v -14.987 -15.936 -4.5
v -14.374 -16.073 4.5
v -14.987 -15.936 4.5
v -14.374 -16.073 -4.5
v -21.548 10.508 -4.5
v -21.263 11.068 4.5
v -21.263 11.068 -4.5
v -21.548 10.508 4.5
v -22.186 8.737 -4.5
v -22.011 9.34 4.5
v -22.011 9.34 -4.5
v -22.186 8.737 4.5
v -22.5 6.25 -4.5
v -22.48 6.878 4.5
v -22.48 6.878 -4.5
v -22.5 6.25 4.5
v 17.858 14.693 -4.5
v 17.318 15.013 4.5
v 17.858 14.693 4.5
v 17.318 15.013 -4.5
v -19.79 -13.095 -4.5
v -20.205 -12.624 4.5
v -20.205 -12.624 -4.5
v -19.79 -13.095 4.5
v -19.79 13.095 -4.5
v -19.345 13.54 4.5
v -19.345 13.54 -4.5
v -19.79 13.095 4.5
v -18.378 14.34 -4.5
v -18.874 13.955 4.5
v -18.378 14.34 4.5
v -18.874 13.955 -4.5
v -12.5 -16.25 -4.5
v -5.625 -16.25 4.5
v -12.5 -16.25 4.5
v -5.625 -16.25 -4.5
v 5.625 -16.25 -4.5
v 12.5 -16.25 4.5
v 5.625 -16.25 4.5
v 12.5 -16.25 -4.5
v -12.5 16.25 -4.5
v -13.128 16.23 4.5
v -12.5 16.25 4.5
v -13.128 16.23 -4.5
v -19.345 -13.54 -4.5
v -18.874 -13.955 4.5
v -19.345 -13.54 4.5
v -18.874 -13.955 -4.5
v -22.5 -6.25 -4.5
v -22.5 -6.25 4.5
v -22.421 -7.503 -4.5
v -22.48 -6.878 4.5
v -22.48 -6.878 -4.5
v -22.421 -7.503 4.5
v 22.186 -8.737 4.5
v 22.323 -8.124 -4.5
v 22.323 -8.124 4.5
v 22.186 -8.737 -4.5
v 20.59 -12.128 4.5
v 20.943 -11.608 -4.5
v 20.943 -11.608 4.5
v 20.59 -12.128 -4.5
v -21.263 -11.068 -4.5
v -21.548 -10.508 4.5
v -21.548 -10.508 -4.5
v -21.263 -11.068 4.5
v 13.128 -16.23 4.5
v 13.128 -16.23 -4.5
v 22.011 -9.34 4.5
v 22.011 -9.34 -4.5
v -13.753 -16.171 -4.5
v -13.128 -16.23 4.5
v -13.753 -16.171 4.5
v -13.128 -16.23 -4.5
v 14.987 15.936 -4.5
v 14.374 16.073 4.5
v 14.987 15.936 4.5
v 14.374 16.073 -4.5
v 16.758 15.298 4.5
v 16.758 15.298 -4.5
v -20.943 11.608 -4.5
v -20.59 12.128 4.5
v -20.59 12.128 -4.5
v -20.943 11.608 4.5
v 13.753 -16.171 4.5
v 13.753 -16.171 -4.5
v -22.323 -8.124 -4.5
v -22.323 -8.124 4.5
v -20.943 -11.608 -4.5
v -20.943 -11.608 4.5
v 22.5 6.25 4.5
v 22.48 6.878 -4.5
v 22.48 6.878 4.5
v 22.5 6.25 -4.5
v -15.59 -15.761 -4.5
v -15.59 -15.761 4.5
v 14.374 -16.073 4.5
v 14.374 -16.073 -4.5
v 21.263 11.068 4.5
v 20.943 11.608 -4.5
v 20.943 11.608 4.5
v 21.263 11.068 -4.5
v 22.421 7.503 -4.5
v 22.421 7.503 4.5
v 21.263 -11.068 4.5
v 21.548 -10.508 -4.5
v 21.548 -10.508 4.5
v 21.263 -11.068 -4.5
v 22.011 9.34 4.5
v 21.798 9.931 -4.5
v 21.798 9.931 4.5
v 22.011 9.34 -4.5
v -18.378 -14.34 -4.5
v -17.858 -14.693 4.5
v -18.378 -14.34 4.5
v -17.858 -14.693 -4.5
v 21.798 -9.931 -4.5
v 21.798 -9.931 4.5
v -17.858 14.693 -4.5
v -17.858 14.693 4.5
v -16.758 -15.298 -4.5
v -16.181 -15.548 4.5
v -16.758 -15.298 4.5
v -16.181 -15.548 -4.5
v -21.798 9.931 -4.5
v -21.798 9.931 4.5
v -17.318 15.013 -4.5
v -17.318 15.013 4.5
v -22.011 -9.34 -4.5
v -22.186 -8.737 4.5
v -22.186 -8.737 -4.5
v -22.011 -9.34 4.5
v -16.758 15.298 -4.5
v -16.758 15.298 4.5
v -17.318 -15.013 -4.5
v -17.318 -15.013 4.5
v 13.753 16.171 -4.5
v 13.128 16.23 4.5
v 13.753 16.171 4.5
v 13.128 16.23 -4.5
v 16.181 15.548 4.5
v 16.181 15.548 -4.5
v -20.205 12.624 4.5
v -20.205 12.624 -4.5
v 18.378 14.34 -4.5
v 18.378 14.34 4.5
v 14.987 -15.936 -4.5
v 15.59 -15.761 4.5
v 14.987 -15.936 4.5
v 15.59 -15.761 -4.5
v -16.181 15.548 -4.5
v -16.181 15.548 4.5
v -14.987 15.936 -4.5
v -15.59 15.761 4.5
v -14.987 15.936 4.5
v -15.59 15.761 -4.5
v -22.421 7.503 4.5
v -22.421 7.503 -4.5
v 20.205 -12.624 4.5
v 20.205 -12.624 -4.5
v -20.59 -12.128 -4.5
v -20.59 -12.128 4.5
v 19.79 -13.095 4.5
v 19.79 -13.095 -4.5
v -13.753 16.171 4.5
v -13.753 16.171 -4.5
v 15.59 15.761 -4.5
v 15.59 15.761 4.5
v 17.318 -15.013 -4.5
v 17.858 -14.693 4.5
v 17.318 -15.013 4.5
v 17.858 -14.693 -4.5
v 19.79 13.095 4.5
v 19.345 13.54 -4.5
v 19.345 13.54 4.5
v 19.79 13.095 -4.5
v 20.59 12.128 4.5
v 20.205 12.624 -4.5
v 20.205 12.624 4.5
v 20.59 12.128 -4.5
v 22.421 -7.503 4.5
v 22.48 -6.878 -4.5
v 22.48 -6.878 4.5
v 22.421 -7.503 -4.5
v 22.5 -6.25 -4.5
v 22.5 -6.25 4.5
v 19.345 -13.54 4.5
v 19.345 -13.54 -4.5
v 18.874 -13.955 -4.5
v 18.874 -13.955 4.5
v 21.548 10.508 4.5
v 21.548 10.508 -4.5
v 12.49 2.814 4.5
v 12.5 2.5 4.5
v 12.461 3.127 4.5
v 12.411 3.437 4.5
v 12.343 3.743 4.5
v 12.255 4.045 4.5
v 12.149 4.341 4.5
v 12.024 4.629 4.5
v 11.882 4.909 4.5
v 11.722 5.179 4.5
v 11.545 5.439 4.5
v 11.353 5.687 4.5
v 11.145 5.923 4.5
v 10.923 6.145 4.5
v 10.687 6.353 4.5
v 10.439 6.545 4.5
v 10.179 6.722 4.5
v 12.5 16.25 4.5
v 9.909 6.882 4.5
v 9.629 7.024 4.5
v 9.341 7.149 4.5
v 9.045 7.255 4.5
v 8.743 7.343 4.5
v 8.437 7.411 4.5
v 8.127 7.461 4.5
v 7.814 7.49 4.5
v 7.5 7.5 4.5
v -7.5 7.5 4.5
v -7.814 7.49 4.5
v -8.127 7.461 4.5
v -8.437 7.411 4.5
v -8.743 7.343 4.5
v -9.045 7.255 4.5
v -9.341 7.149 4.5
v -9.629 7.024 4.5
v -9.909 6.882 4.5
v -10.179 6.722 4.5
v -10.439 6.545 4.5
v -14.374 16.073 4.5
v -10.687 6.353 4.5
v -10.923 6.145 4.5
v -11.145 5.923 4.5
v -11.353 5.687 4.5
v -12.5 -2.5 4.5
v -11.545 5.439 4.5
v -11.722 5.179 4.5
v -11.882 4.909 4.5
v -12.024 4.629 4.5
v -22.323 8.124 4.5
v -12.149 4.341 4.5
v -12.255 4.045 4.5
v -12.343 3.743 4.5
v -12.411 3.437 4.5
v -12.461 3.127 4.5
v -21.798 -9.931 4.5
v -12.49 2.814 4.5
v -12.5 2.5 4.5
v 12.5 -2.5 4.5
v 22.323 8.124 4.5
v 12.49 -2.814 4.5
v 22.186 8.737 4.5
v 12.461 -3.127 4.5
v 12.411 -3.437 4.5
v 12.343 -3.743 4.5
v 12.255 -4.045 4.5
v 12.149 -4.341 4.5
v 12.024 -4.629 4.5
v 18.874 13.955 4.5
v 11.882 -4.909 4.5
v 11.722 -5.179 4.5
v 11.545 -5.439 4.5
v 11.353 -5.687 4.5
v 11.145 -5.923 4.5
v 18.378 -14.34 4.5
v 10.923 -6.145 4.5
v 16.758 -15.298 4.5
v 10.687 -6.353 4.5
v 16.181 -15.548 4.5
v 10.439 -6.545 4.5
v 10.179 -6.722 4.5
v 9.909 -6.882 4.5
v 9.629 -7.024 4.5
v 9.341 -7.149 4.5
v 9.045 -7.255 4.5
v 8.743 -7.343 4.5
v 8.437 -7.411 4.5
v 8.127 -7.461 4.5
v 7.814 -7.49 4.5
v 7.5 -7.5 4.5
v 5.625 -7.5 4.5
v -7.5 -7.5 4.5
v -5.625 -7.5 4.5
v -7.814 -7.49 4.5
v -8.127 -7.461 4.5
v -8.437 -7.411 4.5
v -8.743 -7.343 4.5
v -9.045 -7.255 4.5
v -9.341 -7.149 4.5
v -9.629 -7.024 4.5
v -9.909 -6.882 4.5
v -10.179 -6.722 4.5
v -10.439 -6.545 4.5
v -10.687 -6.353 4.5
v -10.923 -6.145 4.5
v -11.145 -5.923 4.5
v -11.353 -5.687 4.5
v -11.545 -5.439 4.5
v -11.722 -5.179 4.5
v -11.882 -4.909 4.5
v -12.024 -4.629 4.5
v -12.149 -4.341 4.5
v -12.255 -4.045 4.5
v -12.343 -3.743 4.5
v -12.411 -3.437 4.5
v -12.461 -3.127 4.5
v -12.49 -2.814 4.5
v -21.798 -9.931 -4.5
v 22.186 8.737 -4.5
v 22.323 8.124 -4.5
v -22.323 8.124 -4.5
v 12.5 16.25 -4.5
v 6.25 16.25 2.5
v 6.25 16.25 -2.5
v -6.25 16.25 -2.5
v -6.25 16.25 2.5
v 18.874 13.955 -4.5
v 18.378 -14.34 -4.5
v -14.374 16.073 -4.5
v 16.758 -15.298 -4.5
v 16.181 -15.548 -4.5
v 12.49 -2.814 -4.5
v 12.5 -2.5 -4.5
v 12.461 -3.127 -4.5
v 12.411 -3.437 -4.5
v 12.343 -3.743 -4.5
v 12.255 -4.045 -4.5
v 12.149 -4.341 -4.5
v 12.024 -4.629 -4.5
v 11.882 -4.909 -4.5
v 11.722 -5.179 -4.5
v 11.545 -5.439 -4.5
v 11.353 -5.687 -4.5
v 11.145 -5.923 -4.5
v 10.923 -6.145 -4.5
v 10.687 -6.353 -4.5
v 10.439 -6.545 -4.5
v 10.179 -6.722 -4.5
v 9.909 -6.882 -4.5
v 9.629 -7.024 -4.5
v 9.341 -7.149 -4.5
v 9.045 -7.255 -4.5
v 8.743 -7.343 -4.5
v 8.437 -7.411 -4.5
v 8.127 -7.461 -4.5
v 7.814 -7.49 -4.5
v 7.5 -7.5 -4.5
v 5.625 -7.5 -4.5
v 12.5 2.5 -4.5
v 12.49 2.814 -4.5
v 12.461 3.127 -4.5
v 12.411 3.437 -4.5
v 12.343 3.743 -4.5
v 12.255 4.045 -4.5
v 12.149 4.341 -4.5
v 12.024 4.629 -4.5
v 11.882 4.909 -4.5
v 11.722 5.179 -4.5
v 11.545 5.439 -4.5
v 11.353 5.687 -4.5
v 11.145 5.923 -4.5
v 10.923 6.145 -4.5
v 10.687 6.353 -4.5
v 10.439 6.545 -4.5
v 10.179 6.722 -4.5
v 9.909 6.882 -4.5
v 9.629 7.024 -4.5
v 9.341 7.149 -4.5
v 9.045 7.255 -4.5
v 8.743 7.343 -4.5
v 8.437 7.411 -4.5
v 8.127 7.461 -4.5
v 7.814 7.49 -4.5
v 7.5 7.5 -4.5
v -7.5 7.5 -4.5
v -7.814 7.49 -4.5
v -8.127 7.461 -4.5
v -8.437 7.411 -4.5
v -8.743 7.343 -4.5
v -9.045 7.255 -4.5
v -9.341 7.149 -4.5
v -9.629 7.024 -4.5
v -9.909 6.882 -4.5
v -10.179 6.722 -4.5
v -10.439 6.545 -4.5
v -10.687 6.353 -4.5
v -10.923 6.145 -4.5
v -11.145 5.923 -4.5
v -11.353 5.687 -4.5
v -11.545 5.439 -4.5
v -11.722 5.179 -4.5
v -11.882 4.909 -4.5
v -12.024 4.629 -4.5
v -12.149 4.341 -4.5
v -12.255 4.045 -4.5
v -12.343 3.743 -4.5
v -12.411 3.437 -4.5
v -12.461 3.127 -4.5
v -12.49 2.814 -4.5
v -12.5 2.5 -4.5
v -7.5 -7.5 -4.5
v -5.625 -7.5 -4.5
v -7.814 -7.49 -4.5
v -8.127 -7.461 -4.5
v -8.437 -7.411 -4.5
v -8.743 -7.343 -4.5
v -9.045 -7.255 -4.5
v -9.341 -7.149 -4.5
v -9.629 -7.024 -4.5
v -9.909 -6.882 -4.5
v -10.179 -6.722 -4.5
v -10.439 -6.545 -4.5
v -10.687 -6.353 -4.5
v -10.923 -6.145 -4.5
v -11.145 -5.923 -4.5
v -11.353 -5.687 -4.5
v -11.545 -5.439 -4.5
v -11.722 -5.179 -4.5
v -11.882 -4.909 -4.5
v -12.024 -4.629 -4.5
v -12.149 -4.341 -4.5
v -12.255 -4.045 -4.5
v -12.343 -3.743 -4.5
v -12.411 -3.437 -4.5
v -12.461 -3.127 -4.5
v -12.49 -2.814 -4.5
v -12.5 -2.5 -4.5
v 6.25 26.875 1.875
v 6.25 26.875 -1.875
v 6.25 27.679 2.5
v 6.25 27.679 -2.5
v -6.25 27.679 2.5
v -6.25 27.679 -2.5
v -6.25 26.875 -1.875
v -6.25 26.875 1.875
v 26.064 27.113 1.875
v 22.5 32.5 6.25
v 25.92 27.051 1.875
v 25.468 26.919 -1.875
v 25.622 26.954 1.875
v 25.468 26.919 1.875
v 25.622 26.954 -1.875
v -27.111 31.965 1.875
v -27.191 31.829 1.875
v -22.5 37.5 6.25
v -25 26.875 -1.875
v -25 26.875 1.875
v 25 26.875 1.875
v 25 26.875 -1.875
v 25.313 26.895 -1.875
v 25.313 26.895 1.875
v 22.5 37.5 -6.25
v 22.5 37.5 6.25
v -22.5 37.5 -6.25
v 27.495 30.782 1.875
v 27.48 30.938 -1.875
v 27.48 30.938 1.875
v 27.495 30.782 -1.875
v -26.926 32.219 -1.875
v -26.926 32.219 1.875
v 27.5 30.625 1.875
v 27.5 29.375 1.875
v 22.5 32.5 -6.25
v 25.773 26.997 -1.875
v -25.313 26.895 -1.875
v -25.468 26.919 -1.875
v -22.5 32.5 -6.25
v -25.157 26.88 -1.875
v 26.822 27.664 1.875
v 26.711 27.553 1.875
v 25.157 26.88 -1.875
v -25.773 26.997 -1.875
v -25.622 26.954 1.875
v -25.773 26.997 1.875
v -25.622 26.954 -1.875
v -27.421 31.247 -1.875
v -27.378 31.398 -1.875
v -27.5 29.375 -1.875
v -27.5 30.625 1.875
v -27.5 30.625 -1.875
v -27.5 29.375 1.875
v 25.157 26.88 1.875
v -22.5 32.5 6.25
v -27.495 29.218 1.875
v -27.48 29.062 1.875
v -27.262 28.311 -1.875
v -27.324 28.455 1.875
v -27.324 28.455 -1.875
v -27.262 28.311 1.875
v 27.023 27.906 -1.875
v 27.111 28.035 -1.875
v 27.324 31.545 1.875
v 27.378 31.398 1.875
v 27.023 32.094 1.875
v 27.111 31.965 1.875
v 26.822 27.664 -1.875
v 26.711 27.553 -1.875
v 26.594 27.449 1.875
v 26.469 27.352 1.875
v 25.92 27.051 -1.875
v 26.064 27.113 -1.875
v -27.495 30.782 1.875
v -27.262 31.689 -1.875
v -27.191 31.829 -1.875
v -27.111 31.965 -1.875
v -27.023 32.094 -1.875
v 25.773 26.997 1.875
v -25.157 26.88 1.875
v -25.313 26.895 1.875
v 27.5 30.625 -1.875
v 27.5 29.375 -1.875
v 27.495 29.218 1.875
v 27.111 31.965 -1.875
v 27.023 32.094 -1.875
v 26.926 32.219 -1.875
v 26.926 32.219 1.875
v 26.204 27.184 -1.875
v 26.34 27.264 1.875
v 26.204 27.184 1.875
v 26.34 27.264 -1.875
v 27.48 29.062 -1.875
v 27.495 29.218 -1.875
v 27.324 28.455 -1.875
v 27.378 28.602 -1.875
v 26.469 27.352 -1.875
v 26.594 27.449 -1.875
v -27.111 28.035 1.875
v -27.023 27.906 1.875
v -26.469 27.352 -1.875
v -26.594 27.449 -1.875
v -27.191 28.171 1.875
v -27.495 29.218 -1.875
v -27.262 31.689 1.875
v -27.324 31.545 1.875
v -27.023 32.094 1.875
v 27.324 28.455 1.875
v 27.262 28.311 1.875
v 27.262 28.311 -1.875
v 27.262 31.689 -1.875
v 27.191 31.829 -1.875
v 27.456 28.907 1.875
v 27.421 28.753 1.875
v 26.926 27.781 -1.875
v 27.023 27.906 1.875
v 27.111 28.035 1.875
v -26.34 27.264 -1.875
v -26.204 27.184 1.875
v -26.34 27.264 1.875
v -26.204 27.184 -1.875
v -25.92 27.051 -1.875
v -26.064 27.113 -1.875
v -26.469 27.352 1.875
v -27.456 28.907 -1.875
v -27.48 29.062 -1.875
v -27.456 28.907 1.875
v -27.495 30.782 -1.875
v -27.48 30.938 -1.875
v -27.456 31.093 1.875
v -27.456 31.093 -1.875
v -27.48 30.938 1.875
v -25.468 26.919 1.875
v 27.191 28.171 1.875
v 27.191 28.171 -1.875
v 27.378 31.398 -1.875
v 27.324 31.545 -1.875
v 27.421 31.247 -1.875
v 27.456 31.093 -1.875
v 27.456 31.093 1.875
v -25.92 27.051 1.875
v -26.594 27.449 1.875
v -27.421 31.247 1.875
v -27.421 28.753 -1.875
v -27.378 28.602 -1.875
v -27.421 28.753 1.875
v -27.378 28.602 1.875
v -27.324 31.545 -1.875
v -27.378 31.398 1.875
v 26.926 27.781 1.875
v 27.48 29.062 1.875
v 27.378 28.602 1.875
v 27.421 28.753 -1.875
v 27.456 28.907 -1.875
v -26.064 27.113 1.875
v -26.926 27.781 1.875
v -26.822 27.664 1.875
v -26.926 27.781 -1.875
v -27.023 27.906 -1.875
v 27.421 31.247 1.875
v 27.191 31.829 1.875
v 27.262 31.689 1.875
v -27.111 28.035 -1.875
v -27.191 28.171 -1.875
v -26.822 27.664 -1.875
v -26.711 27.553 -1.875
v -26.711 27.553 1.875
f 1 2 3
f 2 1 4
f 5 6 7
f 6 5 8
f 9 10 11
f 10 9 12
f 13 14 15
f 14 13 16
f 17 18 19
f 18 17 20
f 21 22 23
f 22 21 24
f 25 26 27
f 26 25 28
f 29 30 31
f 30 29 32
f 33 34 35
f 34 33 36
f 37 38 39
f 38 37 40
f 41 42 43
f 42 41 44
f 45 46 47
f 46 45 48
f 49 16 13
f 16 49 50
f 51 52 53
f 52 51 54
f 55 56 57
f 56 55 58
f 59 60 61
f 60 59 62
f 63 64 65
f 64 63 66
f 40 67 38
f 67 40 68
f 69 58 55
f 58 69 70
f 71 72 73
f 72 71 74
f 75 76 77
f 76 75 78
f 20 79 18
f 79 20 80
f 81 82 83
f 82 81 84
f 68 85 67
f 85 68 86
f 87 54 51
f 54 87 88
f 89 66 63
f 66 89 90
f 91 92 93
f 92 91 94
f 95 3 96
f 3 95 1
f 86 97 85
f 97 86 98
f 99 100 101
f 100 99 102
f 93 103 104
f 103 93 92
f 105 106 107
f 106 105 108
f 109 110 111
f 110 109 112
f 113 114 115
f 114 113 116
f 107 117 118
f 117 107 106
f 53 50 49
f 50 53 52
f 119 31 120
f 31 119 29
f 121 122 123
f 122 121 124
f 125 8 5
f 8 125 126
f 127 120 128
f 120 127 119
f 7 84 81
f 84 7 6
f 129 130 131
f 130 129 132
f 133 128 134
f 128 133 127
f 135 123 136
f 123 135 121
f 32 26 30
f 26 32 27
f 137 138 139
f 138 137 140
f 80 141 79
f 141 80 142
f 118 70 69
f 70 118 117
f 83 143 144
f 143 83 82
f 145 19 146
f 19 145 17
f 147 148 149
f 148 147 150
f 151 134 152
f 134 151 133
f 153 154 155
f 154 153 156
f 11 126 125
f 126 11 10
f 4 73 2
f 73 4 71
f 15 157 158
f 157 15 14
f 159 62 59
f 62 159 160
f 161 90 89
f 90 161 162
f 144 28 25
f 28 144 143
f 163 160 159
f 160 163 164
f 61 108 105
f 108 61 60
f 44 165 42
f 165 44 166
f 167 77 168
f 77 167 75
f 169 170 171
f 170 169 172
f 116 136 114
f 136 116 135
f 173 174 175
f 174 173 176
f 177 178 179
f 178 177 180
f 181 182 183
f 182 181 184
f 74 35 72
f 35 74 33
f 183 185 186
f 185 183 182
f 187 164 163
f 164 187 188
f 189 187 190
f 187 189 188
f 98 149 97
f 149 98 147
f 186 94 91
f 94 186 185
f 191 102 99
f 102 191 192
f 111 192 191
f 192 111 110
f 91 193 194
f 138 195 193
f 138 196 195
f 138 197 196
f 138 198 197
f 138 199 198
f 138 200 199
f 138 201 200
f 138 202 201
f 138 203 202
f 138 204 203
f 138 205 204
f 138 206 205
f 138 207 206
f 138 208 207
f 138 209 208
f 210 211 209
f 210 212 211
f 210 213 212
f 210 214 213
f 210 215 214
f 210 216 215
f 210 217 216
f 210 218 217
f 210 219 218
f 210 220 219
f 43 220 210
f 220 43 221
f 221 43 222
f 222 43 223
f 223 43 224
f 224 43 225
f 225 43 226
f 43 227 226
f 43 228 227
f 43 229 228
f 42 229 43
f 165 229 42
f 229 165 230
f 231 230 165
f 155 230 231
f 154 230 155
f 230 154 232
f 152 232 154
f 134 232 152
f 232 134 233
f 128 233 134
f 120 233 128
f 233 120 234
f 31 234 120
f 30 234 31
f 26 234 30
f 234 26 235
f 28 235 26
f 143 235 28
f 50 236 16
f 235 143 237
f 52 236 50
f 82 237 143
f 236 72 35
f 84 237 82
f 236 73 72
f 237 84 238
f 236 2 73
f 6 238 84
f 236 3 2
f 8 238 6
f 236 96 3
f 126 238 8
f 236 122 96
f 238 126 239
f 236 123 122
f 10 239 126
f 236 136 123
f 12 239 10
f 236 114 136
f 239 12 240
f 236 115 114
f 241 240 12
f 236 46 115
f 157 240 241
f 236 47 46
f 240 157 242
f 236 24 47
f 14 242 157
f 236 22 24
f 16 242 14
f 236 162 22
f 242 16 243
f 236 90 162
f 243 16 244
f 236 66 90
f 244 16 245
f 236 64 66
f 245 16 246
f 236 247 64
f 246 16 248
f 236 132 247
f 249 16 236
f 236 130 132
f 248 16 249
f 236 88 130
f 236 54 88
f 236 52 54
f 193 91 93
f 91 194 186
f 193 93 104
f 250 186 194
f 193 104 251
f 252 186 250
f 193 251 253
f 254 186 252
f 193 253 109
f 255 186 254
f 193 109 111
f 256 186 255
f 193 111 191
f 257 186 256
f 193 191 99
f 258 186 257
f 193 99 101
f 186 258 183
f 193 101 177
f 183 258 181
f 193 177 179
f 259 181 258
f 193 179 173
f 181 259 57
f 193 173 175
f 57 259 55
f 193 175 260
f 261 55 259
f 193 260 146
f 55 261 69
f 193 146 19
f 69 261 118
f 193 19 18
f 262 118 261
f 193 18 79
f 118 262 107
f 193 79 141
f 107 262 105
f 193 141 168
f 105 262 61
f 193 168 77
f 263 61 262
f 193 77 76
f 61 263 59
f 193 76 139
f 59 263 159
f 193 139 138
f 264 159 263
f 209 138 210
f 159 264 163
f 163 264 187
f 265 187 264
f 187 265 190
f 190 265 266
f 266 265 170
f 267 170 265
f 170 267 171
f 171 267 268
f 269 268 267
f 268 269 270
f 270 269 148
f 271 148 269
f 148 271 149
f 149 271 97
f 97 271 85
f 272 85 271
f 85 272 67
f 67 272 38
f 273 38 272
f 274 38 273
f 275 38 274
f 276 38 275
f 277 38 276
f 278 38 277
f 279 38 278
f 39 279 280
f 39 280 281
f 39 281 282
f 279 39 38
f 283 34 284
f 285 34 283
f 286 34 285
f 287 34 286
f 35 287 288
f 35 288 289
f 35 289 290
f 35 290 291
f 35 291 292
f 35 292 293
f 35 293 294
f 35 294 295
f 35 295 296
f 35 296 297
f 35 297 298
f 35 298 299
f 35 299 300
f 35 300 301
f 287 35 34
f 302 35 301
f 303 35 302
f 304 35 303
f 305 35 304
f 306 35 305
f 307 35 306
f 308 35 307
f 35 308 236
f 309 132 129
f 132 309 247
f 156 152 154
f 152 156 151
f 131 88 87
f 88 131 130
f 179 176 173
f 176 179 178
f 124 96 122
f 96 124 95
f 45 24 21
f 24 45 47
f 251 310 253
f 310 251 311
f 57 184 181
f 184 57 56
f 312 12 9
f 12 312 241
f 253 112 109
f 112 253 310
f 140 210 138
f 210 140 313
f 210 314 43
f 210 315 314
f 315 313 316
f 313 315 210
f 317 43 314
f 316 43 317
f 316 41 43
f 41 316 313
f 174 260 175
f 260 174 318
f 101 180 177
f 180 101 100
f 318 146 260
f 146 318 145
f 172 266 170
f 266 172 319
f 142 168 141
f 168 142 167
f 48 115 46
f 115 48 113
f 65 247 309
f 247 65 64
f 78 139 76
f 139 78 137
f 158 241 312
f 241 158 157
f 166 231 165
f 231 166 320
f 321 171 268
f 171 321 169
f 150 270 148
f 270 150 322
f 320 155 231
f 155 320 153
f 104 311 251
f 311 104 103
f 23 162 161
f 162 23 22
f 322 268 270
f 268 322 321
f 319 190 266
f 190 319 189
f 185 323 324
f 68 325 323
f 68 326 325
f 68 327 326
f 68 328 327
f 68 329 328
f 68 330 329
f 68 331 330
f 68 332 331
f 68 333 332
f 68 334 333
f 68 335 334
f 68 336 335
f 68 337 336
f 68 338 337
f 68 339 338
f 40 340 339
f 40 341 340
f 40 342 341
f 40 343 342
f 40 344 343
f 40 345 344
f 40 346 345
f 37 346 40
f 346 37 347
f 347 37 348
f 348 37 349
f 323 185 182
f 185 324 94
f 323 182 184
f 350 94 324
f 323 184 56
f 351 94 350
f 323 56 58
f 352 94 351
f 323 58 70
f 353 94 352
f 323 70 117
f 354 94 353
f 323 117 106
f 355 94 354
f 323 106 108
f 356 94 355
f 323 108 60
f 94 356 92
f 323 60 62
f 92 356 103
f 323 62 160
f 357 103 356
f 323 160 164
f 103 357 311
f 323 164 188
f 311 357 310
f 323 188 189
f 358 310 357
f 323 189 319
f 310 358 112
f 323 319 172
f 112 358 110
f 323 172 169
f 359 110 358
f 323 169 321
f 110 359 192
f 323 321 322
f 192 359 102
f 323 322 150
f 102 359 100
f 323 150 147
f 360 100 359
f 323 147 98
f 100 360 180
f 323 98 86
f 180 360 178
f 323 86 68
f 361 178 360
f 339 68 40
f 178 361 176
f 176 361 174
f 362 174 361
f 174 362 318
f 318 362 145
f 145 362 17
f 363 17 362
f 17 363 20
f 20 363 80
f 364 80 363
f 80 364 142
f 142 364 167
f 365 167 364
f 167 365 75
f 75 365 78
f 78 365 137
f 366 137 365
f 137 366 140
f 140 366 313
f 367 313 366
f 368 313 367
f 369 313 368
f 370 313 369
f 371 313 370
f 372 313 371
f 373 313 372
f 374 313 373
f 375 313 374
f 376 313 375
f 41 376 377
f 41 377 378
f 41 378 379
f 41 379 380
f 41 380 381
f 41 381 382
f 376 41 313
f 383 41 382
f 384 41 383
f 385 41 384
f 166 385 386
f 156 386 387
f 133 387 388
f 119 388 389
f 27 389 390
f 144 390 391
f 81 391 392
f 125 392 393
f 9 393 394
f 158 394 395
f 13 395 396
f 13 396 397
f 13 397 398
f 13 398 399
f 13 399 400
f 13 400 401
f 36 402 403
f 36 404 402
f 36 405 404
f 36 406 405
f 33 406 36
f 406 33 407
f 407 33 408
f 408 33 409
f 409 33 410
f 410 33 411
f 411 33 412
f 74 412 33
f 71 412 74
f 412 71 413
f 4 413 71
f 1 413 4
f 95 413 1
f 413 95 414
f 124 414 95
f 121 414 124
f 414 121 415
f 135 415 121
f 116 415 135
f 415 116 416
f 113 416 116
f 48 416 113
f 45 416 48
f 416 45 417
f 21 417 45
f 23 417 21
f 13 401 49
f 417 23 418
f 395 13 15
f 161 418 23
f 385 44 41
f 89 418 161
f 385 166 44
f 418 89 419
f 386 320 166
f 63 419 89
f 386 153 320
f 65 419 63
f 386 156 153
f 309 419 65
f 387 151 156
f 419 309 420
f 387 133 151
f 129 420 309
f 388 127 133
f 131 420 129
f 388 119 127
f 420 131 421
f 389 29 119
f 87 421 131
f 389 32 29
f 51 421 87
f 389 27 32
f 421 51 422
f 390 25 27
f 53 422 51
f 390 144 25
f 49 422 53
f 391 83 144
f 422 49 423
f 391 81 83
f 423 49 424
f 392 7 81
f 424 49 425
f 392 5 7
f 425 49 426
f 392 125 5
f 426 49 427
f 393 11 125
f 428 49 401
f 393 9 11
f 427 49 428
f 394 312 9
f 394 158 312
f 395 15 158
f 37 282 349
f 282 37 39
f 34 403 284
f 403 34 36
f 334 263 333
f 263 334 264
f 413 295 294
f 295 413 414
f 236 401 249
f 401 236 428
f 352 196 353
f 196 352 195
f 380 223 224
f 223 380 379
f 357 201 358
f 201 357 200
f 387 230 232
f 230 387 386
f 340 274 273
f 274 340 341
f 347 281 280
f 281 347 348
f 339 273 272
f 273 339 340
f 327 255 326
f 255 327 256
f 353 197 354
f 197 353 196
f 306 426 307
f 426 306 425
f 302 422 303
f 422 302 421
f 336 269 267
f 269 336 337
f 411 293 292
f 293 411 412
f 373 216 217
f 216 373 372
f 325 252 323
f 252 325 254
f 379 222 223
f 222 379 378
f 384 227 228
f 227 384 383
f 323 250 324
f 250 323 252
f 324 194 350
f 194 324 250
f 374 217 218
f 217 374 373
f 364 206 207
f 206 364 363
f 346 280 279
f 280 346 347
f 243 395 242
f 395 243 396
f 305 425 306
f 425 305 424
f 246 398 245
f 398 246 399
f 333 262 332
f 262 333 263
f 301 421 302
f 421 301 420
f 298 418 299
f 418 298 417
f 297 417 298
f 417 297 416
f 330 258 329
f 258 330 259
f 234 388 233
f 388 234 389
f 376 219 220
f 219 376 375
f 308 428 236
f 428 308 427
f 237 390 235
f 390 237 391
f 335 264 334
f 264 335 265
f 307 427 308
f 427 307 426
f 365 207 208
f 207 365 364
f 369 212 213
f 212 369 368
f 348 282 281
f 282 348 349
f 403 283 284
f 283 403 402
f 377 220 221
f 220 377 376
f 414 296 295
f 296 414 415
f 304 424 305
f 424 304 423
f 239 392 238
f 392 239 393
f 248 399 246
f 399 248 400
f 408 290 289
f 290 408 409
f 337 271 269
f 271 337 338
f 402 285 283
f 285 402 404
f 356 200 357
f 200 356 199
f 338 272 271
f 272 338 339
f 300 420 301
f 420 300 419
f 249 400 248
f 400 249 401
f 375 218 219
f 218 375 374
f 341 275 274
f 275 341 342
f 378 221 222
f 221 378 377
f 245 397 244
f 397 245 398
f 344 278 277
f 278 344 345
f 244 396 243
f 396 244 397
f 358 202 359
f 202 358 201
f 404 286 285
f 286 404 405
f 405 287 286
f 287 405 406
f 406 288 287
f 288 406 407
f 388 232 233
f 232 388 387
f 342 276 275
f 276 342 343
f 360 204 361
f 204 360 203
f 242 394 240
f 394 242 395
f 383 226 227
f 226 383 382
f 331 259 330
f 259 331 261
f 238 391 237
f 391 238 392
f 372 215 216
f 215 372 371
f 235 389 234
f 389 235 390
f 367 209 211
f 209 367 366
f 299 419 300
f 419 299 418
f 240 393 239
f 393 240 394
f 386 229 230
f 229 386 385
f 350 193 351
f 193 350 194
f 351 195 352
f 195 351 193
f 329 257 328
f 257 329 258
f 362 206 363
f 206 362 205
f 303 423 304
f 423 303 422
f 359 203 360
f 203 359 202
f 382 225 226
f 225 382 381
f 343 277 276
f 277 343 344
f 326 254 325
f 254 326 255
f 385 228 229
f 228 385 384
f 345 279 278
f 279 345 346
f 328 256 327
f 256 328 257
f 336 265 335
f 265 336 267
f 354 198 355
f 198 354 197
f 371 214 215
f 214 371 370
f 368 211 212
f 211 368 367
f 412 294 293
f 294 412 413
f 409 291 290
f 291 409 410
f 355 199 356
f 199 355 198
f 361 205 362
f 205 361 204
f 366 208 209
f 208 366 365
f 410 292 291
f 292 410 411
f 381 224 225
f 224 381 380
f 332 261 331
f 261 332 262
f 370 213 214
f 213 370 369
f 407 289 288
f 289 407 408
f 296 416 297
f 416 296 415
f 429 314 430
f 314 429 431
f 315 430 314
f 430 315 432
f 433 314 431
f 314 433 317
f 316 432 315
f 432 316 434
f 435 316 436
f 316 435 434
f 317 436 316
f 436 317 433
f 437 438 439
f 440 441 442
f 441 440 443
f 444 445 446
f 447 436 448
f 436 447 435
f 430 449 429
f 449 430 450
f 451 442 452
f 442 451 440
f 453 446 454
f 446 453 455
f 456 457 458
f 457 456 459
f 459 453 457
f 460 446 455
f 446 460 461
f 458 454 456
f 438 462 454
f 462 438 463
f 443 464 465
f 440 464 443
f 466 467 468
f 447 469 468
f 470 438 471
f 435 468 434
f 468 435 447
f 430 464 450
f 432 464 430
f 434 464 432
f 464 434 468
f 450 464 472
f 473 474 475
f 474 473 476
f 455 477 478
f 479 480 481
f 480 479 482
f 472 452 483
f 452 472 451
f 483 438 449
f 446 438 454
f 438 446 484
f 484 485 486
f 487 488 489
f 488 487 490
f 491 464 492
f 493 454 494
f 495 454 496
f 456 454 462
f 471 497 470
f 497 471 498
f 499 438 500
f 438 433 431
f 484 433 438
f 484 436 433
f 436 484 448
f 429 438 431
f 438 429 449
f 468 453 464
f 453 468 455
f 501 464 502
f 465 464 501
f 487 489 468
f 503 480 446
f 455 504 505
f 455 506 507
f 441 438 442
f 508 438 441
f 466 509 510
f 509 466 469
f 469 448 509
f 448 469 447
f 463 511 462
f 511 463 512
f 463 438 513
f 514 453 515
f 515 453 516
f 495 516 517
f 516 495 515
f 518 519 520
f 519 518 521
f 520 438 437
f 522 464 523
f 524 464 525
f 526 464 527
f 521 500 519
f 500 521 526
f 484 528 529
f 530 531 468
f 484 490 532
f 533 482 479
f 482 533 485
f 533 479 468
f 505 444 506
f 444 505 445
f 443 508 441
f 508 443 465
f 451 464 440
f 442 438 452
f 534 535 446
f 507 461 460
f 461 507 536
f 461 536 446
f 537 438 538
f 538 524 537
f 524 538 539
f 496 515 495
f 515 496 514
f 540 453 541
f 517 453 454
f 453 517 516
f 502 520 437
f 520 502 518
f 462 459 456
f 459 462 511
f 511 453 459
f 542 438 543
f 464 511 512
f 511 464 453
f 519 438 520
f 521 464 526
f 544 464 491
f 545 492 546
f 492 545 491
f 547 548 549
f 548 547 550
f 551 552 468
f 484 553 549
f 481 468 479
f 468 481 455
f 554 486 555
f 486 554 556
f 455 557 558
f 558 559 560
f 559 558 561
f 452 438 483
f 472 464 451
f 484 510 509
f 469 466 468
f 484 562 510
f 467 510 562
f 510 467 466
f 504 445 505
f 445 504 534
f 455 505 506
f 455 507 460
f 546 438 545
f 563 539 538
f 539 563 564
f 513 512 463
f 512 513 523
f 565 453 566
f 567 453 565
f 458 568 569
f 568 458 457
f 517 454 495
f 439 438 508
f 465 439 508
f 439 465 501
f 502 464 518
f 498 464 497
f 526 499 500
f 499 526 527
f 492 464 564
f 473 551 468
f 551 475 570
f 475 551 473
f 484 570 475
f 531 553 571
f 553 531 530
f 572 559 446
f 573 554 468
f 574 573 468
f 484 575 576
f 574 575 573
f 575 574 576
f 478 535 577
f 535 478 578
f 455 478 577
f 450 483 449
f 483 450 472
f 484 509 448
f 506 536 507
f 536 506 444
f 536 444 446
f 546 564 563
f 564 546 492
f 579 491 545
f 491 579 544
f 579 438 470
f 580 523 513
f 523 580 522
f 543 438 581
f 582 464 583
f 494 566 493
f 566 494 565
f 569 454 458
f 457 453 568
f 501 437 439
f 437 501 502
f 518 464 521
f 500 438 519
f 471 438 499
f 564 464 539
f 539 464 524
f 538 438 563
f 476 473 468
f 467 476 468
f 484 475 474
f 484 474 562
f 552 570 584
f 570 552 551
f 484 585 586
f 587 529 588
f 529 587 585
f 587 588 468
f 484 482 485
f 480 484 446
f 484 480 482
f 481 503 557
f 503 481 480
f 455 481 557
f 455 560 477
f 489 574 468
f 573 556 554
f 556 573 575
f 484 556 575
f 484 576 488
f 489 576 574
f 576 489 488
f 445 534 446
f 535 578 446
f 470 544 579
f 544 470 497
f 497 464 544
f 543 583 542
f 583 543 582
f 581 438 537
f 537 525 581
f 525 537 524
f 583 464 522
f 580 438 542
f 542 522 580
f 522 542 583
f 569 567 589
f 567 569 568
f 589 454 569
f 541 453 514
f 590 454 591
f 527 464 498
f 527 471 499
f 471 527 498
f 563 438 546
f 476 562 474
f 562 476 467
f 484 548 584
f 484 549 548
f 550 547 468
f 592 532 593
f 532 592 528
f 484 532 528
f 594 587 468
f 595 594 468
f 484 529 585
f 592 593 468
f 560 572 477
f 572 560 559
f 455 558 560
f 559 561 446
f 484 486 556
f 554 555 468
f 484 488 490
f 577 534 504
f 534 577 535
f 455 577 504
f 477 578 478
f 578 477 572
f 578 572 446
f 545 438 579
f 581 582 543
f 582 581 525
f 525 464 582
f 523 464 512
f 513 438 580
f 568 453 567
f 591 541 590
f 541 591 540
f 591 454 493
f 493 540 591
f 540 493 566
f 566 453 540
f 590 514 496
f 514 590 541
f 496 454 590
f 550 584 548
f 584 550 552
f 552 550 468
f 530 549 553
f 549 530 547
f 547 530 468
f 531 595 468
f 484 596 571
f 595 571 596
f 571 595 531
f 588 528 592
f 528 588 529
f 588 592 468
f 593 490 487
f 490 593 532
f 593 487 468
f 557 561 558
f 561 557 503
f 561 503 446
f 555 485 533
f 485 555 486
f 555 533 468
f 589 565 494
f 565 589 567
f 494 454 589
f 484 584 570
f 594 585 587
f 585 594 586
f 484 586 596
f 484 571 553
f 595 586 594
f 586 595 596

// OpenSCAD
$fn=100;

height = 5;
handle_width = 50;

// Create space to allow for the door handle to fit to the door stop.
module door_stop_inner_shape() {
    minkowski() {
        translate([0,-20,0]) cube([handle_width/4,50,height],center=true);
        cylinder(r=5,h=height,center=true);
    }
}

// Main shape of the door stop
//
// This is used to create main shape of the door stop itself.
module door_stop_main_shape() {
    minkowski() {
        cube([handle_width,handle_width/2,1],center=true);
        cylinder(r=20,h=height,center=true);
    }
}

module top_section() {
    difference() {
        door_stop_main_shape();
        door_stop_inner_shape();
    }
}

module handle_strap_hole() {
    minkowski() {
        translate([0,0,0]) cube([handle_width/2 + 5,10,1], center=true);
        cylinder(r=10,h=height,center=true);
    }
}

module main_handle_bracket() {
    difference() {
        top_section();
        handle_strap_hole();
    }
}

// Connecting part to the door brace and the wall knudge
// TODO: Design this so that it's an actual spring
module wall_knudge_spring() {
    translate([0,45,0]) cube([handle_width/2,handle_width,height * 2], center=true);
}

module wall_knudge_base() {
    hull() {
        minkowski() {
            translate([0,handle_width + 10,0]) {
                cube([handle_width * 2,height/2,height/2], center=true);
            }
            cylinder(r=5,h=height,center=true);
        }
        translate([0,handle_width + 20,0]) {
            cube([90,10,height * height], center=true);
        }
    }
}

module wall_knudge() {
    union() {
        wall_knudge_spring();
        wall_knudge_base();        
    }
}

scale([0.5,0.5,0.5]) {
    scale([1,1,3]) main_handle_bracket();
    wall_knudge();
}
